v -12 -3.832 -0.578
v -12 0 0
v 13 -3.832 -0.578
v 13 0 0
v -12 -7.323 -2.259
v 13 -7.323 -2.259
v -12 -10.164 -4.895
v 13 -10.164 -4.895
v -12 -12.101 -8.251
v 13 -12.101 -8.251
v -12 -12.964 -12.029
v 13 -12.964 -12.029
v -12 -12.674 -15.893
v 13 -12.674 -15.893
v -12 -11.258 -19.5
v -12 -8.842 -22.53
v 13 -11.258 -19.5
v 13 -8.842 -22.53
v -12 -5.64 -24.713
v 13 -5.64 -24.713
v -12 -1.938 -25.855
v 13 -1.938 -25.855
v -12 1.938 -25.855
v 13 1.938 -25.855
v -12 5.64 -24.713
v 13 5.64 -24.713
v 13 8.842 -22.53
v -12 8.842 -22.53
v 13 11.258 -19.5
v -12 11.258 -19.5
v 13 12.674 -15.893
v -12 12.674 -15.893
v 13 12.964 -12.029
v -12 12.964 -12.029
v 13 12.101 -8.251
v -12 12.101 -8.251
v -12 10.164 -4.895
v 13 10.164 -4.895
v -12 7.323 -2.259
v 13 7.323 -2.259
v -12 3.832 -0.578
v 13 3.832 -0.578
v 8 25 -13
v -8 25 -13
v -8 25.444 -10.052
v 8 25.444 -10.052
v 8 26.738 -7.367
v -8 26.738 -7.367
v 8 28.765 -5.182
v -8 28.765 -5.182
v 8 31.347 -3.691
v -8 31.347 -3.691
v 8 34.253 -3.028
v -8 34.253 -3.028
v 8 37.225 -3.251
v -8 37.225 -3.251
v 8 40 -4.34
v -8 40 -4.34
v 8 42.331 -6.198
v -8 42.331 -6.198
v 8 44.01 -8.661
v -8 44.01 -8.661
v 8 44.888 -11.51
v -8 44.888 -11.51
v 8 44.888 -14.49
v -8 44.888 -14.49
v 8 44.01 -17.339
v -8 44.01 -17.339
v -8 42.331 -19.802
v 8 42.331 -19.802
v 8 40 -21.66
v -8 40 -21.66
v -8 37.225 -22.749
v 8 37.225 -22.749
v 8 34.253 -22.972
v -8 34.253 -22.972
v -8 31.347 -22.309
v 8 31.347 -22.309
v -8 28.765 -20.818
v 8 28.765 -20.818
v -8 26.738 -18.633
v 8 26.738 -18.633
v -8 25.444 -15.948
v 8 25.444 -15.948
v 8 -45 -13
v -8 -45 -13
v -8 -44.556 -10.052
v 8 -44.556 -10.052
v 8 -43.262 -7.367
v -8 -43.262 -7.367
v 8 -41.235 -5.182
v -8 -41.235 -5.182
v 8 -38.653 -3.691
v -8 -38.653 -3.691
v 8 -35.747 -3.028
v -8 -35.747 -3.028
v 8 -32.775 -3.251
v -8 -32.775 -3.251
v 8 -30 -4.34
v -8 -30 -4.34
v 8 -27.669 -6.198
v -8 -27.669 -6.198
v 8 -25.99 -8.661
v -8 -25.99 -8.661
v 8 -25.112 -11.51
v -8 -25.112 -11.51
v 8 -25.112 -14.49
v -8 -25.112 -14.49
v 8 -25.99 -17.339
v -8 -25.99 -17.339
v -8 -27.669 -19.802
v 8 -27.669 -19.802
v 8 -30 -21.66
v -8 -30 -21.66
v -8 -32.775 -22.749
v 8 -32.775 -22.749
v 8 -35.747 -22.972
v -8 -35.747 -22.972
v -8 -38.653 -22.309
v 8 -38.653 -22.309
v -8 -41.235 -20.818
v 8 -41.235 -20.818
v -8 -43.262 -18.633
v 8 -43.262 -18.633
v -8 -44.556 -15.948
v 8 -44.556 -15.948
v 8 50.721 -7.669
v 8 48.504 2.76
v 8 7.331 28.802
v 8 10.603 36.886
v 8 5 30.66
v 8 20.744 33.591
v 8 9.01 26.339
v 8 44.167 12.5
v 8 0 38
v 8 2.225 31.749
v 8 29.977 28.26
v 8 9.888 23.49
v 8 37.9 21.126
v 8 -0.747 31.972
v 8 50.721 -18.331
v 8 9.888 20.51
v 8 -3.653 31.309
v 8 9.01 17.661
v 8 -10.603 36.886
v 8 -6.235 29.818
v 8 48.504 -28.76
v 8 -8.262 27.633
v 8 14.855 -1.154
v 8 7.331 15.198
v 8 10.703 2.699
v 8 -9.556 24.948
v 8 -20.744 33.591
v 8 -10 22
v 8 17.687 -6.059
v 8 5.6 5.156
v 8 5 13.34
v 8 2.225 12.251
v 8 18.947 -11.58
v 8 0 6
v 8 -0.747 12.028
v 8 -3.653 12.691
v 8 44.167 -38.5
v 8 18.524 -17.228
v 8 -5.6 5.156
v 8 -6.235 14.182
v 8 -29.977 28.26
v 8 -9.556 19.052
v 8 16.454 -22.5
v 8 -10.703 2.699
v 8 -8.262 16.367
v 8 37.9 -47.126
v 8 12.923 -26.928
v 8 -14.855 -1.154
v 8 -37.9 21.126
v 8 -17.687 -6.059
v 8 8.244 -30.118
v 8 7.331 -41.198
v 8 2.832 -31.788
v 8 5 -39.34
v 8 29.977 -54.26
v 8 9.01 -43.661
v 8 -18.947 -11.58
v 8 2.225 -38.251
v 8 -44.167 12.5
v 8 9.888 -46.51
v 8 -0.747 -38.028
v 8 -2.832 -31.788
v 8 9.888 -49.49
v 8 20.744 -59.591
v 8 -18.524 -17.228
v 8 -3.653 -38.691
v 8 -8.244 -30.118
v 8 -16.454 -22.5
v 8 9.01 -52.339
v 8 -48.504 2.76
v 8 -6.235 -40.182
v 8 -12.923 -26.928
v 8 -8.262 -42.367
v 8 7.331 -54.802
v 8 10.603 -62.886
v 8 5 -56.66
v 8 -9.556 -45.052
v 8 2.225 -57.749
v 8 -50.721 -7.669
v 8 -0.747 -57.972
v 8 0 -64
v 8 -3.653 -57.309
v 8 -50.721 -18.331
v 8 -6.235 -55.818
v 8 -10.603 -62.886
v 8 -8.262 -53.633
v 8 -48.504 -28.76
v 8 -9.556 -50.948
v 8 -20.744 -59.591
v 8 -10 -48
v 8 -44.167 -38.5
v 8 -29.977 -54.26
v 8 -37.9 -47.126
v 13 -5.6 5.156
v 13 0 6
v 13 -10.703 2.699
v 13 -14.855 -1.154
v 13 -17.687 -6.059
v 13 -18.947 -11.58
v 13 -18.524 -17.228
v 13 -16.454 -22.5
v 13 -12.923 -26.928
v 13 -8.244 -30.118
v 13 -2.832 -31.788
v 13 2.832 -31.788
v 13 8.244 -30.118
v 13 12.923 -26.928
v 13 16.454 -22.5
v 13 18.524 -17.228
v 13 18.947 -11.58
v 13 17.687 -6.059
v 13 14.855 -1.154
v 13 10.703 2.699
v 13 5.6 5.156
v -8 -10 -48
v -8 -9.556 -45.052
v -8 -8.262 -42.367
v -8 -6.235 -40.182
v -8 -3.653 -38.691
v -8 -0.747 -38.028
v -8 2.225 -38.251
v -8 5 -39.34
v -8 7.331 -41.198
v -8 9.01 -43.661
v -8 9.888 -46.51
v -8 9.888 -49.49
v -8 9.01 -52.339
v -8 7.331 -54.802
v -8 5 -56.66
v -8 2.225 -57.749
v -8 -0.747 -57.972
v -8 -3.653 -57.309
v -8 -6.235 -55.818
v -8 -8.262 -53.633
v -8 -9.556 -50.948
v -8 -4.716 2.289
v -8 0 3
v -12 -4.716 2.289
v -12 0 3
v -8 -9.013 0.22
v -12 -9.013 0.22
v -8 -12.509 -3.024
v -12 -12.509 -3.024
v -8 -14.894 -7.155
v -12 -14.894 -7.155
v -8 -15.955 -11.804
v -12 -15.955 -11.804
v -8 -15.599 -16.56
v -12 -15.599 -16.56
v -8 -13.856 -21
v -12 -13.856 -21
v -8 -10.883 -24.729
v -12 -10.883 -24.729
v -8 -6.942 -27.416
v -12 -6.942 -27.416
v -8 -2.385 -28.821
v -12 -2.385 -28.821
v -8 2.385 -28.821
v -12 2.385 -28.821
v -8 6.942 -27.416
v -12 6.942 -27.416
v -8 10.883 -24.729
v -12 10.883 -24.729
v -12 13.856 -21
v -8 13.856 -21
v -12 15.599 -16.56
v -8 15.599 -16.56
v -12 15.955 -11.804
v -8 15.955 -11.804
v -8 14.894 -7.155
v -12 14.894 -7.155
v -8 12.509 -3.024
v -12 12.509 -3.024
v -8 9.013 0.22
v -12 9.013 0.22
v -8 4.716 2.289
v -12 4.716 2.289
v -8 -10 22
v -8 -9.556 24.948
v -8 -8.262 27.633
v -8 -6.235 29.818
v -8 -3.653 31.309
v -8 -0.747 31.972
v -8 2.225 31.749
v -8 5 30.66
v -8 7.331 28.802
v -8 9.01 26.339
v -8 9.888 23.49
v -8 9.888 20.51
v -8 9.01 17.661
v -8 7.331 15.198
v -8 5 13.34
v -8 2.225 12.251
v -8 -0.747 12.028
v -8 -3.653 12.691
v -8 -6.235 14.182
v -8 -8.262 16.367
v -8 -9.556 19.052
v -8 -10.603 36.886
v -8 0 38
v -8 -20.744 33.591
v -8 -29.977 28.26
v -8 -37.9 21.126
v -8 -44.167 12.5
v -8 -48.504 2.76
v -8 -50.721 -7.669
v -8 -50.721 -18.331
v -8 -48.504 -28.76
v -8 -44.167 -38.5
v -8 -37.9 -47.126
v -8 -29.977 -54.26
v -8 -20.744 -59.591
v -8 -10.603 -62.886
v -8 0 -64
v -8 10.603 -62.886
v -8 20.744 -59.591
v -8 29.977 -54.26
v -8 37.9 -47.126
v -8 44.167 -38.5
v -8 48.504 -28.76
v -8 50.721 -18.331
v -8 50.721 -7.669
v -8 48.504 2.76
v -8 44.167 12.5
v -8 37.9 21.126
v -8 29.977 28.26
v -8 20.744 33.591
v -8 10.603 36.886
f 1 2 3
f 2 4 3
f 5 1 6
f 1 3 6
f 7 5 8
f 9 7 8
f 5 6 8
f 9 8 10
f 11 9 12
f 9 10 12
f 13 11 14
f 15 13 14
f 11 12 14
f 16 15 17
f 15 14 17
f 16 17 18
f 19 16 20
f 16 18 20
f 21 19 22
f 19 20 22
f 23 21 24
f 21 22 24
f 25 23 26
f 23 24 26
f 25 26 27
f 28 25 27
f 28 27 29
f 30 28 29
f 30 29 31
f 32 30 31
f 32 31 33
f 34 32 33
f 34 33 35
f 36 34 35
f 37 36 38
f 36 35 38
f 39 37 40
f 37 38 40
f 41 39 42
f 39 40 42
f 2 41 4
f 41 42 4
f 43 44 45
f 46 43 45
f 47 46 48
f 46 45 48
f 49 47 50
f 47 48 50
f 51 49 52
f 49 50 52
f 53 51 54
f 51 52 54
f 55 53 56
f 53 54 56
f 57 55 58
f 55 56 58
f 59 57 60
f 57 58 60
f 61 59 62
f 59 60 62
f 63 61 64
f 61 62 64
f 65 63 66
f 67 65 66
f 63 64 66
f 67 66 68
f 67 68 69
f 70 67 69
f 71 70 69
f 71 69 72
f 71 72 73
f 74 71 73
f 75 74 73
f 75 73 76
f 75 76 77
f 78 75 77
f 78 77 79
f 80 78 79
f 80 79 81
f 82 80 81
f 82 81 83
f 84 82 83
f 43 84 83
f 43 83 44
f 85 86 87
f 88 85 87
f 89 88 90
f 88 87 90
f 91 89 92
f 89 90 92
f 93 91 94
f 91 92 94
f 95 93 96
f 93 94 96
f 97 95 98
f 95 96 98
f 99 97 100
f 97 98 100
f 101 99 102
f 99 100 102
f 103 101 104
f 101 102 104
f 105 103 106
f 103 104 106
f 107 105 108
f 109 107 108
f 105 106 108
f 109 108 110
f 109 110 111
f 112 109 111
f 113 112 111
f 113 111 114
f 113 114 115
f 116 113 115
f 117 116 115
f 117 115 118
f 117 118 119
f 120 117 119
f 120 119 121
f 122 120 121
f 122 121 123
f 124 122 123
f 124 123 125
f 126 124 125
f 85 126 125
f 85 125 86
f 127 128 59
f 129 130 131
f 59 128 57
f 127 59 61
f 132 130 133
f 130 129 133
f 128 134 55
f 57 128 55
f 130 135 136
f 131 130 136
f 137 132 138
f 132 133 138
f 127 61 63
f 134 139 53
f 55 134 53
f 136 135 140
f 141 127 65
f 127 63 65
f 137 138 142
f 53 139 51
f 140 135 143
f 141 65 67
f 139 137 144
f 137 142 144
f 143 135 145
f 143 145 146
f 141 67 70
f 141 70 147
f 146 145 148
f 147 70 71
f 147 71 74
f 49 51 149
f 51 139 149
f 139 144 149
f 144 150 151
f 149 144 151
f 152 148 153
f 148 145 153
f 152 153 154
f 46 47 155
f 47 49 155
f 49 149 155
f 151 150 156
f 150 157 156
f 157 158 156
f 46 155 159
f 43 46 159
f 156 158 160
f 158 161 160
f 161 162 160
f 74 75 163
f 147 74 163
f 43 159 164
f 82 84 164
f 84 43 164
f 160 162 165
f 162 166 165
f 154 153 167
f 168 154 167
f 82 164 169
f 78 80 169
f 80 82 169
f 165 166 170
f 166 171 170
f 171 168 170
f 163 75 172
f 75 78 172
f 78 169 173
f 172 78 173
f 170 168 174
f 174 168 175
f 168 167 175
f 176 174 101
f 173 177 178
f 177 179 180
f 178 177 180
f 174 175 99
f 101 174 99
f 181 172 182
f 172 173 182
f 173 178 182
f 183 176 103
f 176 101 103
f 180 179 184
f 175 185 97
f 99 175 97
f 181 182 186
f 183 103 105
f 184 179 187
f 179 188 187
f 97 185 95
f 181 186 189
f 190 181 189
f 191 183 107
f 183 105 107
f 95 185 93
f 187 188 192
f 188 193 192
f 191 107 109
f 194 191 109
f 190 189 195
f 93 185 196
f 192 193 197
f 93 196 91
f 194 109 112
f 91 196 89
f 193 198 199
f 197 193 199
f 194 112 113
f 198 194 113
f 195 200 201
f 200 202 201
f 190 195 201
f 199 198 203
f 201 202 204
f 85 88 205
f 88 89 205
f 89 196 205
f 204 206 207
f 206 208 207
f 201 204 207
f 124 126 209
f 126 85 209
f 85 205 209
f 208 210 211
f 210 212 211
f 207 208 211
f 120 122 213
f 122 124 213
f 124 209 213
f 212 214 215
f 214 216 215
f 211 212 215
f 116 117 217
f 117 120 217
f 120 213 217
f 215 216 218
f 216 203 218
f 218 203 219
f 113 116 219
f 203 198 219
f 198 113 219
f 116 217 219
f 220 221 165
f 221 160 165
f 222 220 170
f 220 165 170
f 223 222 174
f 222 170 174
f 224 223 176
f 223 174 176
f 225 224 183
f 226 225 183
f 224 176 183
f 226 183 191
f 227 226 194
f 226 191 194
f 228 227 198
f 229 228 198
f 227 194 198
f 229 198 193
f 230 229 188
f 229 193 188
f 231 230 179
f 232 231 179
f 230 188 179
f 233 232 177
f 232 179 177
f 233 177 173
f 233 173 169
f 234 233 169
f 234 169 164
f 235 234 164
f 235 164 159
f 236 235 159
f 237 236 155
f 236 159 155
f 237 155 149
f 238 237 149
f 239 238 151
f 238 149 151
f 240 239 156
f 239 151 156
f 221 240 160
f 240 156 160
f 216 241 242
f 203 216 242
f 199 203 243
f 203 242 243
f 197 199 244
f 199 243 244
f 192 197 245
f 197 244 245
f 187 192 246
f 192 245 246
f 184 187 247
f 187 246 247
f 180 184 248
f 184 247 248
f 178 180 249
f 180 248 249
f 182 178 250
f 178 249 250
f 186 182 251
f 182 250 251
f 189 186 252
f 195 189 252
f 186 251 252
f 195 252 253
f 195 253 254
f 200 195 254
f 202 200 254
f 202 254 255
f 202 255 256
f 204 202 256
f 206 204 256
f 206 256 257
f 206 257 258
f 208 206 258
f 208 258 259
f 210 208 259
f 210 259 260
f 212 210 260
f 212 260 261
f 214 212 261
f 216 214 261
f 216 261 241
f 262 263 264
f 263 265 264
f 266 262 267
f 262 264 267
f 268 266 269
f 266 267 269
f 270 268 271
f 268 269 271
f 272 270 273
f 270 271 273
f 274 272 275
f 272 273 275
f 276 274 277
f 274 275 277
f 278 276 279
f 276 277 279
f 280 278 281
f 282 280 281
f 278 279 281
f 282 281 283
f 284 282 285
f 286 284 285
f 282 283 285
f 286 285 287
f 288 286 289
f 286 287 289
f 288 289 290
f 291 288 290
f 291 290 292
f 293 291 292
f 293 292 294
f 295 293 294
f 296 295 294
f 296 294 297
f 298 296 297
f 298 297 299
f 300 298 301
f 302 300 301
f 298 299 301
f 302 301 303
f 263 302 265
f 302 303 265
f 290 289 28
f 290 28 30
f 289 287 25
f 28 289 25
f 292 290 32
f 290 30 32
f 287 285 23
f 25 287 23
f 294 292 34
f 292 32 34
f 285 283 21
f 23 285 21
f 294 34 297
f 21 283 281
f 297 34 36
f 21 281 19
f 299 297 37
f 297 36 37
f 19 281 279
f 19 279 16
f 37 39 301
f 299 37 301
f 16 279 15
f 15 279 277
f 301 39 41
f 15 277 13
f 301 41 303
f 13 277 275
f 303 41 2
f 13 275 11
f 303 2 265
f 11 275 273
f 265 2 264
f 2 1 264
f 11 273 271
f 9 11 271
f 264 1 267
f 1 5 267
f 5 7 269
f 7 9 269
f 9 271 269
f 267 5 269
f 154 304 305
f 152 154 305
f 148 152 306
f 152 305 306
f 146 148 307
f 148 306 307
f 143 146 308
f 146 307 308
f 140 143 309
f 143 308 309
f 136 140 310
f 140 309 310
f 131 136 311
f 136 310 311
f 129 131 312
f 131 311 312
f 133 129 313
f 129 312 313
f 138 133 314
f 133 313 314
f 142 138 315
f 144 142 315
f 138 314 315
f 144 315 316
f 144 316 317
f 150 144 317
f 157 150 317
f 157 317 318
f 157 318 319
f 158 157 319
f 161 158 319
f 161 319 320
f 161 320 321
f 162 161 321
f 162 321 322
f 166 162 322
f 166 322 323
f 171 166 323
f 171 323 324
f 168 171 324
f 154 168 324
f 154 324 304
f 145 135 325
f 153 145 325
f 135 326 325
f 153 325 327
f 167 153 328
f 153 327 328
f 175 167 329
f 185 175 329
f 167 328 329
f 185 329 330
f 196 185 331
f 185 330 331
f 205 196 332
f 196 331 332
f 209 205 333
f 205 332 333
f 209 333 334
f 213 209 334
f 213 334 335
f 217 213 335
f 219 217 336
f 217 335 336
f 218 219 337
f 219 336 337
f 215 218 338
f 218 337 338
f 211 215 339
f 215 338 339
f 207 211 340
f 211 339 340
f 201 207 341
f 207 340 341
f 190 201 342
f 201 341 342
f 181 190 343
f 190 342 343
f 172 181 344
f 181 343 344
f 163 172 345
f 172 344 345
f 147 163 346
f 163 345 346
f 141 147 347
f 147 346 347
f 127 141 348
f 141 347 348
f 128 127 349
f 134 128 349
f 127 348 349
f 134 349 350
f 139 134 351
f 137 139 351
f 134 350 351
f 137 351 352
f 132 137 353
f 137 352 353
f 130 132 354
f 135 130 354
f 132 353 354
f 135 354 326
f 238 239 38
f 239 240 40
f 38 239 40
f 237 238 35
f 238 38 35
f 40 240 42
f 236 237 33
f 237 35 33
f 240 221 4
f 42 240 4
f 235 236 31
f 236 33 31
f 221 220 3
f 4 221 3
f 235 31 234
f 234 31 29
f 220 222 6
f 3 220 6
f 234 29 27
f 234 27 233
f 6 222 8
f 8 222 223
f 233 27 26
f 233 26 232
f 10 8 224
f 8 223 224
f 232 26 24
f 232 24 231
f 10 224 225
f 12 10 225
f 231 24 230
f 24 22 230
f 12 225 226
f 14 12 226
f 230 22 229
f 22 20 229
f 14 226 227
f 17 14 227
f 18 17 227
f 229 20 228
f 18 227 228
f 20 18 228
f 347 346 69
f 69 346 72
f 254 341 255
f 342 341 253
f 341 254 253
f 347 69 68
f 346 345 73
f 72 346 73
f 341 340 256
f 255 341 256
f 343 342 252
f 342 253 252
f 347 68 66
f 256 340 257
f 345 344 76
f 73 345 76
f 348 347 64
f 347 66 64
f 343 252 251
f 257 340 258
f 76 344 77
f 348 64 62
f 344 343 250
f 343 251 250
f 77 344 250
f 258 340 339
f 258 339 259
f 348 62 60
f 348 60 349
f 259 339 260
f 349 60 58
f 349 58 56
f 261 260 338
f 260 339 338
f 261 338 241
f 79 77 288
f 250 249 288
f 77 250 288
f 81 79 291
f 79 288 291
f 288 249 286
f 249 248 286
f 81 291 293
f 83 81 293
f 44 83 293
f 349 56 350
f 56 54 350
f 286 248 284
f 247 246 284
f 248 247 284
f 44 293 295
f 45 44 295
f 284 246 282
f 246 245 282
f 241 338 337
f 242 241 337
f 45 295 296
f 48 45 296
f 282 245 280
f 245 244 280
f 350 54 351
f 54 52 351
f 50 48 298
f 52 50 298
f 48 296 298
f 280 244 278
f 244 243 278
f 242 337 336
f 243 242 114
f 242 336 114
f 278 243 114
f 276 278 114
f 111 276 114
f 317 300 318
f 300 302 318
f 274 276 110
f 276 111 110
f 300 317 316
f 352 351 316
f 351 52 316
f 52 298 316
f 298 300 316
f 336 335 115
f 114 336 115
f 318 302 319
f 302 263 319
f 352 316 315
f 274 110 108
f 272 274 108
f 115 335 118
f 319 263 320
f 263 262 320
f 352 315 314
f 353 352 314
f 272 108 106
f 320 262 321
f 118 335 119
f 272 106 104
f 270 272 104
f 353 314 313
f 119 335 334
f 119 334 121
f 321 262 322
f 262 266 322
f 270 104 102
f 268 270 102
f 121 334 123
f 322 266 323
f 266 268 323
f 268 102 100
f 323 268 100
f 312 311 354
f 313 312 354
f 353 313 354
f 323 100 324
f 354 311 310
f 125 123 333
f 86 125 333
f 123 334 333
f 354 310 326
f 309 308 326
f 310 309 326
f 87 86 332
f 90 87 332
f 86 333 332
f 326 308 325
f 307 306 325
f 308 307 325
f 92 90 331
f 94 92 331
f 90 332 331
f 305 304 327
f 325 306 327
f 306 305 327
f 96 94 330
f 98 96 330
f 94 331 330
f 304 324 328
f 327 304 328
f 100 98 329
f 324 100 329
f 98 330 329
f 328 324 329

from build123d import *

# Parameters (mm, degrees)
F3_D = 20


with BuildPart() as f1:
    # F0 (on Front) → F1 (revolve)
    with BuildSketch(Plane.XZ):
        Polygon((8, 38), (-8, 38), (-8, 3), (-12, 3), (-12, 0), (13, 0), (13, 6), (8, 6), align=None)
    revolve(axis=Axis((1.21409, 0, -13), (1, 0, 0)))

    # F3 (through all)
    with Locations(Plane.YZ.offset(8)):
        with Locations((0, 22), (-35, -13), (0, -48), (35, -13)):
            Hole(F3_D / 2)


solid = f1.part
